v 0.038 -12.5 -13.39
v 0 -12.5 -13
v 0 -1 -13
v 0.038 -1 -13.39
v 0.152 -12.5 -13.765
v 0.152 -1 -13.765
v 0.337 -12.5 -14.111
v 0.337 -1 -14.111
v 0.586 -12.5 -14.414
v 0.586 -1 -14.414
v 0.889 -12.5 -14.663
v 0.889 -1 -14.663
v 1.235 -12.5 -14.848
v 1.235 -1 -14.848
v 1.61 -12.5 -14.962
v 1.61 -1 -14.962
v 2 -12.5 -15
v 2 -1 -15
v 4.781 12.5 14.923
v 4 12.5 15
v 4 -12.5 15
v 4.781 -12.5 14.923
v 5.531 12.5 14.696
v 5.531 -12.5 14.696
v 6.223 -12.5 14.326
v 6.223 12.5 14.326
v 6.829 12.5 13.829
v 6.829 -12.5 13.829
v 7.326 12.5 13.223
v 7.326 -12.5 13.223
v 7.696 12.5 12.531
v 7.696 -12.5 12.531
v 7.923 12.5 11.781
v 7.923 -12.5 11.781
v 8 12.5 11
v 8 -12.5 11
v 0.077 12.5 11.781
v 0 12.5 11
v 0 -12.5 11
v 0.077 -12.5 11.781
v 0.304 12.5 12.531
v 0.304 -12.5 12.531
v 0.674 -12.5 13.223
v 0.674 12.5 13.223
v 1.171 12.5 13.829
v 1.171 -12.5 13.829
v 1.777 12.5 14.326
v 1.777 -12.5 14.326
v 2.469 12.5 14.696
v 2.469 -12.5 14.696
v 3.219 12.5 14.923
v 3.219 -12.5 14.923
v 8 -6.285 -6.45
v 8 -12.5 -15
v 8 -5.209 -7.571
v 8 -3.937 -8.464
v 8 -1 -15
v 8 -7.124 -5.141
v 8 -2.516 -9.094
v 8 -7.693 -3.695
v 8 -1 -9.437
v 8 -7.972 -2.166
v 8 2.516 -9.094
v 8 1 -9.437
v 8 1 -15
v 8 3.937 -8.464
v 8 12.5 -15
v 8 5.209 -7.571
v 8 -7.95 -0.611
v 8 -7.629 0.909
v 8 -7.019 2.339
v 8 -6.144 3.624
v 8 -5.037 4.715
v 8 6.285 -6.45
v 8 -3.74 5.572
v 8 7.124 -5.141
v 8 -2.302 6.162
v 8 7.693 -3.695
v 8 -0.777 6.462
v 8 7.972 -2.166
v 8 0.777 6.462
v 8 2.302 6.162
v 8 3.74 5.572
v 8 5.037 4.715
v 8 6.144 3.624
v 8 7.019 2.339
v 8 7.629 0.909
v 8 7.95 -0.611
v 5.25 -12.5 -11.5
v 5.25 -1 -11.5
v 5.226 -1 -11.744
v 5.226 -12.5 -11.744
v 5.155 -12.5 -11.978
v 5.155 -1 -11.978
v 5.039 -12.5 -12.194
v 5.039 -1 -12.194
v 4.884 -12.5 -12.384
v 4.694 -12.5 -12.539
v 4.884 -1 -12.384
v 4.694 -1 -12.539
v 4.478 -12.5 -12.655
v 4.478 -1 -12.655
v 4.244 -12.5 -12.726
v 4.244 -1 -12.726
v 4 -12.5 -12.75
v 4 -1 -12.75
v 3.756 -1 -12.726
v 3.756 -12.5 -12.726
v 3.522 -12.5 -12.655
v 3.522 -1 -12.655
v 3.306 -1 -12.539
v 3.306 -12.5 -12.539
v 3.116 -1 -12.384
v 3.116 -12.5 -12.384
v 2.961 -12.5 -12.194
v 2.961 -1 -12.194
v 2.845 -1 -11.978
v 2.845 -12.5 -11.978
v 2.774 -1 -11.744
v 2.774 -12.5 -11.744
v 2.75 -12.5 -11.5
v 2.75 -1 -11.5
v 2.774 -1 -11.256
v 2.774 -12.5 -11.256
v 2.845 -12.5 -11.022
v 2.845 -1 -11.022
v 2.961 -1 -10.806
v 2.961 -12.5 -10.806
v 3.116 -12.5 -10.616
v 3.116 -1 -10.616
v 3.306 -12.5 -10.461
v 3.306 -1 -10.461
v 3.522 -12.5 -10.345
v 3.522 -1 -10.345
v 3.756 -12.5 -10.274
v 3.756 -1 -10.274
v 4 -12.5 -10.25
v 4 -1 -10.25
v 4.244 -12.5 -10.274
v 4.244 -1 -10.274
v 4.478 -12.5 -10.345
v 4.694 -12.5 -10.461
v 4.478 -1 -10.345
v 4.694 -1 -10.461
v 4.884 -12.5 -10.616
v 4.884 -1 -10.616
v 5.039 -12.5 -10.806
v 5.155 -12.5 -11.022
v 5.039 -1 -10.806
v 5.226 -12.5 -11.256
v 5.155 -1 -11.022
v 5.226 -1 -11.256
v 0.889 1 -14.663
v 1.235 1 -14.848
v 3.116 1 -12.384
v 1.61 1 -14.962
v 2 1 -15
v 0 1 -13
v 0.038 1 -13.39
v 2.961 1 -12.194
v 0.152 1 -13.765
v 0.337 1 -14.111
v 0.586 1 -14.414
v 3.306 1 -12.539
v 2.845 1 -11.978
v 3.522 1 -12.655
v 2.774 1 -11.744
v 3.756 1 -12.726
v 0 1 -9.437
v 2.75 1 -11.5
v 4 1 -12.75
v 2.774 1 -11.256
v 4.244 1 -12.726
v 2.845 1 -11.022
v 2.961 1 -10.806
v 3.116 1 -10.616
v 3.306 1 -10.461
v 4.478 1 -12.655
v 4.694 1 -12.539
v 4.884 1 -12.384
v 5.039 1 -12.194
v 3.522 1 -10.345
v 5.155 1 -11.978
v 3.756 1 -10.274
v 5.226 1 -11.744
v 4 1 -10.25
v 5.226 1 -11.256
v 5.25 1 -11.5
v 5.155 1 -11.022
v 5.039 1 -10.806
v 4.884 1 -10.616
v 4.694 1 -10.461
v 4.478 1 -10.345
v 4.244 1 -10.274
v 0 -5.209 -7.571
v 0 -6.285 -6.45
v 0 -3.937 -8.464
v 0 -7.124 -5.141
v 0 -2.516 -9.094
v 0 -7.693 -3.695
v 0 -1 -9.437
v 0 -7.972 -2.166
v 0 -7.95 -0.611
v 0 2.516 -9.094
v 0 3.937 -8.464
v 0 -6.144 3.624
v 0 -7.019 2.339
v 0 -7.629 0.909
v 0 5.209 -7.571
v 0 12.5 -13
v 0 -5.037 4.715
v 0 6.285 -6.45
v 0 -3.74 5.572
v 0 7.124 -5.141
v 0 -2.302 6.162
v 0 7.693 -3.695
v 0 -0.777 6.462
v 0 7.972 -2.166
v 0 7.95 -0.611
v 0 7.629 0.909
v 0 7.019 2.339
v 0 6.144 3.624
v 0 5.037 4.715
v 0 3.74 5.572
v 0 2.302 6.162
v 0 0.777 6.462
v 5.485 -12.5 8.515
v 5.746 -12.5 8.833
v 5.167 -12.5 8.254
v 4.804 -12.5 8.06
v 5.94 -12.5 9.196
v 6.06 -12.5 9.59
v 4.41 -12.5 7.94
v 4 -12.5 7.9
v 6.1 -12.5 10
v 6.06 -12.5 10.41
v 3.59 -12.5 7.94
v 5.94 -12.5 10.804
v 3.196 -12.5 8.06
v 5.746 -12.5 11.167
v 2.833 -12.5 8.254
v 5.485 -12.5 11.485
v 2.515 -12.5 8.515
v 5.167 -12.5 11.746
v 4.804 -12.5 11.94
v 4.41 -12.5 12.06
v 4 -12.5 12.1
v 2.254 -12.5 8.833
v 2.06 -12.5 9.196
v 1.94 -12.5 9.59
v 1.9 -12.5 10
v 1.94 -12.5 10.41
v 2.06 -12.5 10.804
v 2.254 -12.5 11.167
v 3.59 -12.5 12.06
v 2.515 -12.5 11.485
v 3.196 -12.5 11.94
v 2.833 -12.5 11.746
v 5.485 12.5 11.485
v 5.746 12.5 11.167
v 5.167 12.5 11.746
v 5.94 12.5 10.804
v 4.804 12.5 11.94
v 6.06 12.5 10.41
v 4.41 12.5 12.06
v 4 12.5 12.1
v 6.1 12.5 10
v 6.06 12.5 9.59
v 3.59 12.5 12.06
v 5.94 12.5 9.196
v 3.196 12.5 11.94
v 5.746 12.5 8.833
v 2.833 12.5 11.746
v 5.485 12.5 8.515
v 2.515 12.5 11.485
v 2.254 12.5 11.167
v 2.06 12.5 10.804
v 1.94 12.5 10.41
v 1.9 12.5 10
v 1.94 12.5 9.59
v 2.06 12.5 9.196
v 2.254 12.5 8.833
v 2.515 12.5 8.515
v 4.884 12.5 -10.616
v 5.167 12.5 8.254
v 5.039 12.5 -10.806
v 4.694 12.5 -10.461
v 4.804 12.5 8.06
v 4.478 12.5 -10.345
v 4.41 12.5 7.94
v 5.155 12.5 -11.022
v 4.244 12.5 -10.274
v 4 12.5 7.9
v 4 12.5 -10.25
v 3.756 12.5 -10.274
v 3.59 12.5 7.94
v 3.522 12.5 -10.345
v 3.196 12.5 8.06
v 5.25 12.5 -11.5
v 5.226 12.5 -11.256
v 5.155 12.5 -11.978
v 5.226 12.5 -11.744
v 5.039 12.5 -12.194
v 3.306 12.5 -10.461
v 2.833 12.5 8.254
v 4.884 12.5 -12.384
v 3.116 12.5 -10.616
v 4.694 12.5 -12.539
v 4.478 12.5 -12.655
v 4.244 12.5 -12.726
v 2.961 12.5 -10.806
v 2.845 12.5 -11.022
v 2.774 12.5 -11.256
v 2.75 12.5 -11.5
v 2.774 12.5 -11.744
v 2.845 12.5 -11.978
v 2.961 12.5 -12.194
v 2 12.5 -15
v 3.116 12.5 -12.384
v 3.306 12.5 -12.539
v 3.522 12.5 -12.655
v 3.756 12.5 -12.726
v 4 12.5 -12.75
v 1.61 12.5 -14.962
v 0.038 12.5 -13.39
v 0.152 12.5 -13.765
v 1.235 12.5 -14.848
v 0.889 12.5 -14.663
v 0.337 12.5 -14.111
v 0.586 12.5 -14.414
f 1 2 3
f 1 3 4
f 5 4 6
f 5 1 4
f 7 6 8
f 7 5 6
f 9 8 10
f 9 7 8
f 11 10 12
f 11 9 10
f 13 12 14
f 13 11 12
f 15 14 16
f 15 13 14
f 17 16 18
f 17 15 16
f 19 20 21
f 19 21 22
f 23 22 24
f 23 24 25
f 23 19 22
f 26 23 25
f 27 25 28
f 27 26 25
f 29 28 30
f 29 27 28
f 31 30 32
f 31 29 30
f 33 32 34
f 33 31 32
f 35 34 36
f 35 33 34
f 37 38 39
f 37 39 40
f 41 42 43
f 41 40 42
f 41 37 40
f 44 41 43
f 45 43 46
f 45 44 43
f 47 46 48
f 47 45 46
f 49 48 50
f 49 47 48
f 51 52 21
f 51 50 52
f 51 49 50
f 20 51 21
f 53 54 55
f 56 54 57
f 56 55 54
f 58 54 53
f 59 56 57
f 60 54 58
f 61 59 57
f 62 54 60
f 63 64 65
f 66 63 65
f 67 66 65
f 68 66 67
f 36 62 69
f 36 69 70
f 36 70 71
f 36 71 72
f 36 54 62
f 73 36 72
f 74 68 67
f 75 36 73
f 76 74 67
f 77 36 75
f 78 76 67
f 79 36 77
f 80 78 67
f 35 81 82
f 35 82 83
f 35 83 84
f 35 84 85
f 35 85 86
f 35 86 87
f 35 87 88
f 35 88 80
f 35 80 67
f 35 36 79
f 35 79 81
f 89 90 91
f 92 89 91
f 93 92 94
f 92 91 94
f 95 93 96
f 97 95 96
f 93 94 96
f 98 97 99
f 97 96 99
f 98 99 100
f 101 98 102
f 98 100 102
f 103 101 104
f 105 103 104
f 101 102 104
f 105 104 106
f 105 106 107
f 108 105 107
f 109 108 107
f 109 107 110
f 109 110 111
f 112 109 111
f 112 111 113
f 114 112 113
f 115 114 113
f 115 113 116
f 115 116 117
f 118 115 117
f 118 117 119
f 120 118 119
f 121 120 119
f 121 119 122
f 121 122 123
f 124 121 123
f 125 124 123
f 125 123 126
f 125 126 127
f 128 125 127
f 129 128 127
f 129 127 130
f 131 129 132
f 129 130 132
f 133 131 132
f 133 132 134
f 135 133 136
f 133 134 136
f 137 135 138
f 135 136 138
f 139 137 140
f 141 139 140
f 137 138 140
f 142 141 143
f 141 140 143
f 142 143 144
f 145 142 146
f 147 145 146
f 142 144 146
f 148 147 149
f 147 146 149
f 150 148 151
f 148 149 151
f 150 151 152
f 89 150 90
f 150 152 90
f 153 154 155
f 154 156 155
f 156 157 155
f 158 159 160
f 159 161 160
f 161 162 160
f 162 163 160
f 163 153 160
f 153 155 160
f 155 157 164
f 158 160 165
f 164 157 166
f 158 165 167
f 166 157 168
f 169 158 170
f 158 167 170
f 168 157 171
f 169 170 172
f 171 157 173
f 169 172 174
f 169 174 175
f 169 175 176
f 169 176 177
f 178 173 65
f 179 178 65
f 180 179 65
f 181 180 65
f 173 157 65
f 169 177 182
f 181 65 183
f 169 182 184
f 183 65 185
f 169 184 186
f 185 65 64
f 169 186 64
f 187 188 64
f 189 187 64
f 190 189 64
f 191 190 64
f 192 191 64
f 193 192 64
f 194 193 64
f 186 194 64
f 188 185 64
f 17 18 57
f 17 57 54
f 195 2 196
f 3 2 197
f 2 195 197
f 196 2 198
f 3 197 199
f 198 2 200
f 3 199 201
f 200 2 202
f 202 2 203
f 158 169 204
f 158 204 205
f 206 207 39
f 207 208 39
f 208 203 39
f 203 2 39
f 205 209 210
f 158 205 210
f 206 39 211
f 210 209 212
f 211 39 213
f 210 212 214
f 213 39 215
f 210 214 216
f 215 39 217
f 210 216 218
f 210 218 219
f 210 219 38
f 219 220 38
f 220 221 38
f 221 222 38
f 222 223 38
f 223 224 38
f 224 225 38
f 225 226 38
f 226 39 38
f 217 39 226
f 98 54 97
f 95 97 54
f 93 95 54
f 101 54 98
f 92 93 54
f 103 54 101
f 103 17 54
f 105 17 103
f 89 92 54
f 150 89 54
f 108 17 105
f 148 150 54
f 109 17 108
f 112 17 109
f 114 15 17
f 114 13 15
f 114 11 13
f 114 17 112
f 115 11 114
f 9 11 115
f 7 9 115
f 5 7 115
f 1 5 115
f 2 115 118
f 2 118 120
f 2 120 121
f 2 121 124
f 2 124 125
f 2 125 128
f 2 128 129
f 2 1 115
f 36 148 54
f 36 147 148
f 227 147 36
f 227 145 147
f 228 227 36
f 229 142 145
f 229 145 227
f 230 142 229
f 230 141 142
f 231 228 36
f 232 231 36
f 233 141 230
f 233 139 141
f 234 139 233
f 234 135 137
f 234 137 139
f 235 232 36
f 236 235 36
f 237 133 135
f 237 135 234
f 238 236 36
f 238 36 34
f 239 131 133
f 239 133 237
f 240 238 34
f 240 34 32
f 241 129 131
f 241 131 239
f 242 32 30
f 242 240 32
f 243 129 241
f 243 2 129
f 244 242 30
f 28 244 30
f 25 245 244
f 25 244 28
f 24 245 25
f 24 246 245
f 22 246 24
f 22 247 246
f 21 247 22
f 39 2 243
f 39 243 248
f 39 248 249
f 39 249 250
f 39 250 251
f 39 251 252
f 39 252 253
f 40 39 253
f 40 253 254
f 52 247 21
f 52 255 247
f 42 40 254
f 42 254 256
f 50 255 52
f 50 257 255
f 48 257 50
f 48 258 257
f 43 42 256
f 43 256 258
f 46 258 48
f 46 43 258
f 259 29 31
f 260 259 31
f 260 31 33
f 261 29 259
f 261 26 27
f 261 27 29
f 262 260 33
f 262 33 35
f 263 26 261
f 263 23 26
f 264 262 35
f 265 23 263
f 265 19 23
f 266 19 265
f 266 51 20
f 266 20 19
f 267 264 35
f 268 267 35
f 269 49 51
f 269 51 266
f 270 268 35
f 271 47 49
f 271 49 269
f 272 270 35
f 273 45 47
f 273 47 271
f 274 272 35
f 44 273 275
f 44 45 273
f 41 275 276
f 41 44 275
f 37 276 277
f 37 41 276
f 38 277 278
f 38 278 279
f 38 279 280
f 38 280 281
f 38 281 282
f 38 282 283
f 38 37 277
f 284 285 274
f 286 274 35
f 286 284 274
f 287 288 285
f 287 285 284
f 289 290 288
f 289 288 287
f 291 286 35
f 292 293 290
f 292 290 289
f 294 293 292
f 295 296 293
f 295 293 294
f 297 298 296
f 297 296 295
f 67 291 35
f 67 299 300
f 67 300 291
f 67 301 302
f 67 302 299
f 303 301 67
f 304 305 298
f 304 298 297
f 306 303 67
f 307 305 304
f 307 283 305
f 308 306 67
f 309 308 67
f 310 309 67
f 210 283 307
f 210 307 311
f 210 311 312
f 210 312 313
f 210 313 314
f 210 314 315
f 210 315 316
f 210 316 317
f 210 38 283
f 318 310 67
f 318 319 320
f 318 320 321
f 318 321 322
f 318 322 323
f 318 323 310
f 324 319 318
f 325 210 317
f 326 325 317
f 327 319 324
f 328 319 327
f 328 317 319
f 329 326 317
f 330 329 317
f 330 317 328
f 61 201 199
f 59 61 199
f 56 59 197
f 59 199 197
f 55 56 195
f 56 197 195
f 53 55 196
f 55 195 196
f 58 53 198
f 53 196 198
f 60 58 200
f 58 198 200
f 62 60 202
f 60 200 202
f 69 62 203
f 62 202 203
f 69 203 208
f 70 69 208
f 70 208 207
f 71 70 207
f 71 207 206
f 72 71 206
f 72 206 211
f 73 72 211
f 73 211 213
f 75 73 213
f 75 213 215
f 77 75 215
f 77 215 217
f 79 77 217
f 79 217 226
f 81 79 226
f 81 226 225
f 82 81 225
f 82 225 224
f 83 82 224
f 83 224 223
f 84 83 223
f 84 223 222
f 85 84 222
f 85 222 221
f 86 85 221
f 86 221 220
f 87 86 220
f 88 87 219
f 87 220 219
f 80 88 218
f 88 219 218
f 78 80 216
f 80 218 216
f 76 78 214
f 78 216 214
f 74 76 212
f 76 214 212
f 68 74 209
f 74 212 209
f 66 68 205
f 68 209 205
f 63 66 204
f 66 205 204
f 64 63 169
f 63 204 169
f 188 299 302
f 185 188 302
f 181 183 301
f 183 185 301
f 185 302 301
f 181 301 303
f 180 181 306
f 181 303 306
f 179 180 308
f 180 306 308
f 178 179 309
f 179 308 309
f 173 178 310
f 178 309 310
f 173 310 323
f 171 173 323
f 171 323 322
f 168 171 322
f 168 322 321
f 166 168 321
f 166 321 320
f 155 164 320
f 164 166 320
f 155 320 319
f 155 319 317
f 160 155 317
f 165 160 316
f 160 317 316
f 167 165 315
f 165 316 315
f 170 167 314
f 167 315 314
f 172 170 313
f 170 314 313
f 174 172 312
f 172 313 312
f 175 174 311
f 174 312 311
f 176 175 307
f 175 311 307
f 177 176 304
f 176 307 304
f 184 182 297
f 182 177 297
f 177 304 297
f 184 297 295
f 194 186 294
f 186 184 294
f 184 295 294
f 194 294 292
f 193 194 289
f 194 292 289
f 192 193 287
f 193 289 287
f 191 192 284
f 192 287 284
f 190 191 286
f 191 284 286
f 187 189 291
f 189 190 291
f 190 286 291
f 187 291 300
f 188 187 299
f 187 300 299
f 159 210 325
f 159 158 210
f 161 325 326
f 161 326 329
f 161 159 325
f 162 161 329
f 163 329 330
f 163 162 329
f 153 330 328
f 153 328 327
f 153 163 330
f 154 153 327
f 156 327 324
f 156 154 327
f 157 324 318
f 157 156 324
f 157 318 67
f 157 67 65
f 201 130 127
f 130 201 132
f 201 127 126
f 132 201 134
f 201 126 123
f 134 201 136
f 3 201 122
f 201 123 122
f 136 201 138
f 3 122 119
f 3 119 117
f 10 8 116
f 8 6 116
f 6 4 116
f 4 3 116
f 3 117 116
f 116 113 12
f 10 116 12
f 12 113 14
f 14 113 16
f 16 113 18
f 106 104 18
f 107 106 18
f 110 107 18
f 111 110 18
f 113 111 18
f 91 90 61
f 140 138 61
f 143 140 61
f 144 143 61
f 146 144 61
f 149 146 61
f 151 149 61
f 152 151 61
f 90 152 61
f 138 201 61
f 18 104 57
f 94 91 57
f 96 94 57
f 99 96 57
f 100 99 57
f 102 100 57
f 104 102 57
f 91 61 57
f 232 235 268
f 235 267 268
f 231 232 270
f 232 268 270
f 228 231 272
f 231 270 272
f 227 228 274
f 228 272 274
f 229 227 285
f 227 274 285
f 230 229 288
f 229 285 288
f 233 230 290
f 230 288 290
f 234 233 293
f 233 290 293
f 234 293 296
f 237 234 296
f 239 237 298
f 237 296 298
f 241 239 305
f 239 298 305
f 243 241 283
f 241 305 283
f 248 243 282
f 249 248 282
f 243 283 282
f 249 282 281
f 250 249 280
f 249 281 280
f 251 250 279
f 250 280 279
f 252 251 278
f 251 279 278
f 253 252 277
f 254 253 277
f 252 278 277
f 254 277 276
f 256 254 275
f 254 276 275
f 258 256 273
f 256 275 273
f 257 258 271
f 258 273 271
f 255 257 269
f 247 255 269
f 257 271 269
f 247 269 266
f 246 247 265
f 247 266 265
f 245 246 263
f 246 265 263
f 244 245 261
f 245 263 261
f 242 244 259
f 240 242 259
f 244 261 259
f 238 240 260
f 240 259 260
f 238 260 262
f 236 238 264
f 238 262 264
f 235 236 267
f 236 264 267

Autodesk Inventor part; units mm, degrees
ref_plane "YZ Plane" through (0, 0, 0) normal (1, 0, 0) x (0, 1, 0)
ref_plane "XZ Plane" through (0, 0, 0) normal (0, 1, 0) x (-1, 0, 0)
ref_plane "XY Plane" through (0, 0, 0) normal (0, 0, 1) x (1, 0, 0)
sketch "Sketch1" plane through (0, 0, 0) normal (1, 0, 0) x (0, 1, 0)
  line L0 (-12.5, 15) -> (12.5, 15)
  line L1 (12.5, 15) -> (12.5, -15)
  line L2 (12.5, -15) -> (-12.5, -15)
  line L3 (-12.5, -15) -> (-12.5, 15)
  line L4 (-12.5, 15) -> (12.5, -15) construction
  line L5 (12.5, 15) -> (-12.5, -15) construction
  line L6 (0, -15) -> (0, -1.5)
  circle A0 centre (0, -1.5) radius 8
  point P0 (0, 0)
  dimension "d0" = 25
  dimension "d1" = 30
  dimension "d2" = 13.5
  dimension "d3" = 16
extrude "Extrusion1" add sketch "Sketch1" along normal blind 8
sketch "Sketch2" plane through (8, 0, 0) normal (1, 0, 0) x (0, 0, -1)
  line L0 (7.5, -1) -> (22.5, -1)
  line L1 (22.5, -1) -> (22.5, 1)
  line L2 (22.5, 1) -> (7.5, 1)
  line L3 (7.5, 1) -> (7.5, -1)
  line L4 (15, -12.5) -> (15, 12.5) projected
  line L5 (7.5, -1) -> (22.5, 1) construction
  line L6 (22.5, -1) -> (7.5, 1) construction
  point P0 (0, 0)
  point P1 (15, 0)
  dimension "d6" = 2
  dimension "d17" = 15
extrude "Extrusion2" cut sketch "Sketch2" against normal up to next
sketch "Sketch3" plane through (0, 12.5, 15) normal (0, 1, 0) x (1, 0, 0)
  line L0 (0, 0) -> (8, 0) projected
  line L1 (4, 0) -> (4, 5)
  circle A0 centre (4, 5) radius 2.1
  point P0 (0, 15)
  dimension "d9" = 5
  dimension "d10" = 4.2
extrude "Extrusion3" cut sketch "Sketch3" against normal up to next
sketch "Sketch4" plane through (0, 12.5, 15) normal (0, 1, 0) x (1, 0, 0)
  line L0 (0, 30) -> (8, 30) projected
  line L1 (4, 30) -> (4, 26.5)
  circle A0 centre (4, 26.5) radius 1.25
  point P0 (0, 15)
  dimension "d13" = 3.5
  dimension "d14" = 2.5
extrude "Extrusion4" cut sketch "Sketch4" against normal through all
fillet "Fillet1" radius 4 2 edges at (0, 0, 15) (8, 0, 15)
fillet "Fillet2" radius 2 2 edges at (0, 6.75, -15) (0, -6.75, -15)
properties part number "arm_grip" material "Nylon 6/6"
